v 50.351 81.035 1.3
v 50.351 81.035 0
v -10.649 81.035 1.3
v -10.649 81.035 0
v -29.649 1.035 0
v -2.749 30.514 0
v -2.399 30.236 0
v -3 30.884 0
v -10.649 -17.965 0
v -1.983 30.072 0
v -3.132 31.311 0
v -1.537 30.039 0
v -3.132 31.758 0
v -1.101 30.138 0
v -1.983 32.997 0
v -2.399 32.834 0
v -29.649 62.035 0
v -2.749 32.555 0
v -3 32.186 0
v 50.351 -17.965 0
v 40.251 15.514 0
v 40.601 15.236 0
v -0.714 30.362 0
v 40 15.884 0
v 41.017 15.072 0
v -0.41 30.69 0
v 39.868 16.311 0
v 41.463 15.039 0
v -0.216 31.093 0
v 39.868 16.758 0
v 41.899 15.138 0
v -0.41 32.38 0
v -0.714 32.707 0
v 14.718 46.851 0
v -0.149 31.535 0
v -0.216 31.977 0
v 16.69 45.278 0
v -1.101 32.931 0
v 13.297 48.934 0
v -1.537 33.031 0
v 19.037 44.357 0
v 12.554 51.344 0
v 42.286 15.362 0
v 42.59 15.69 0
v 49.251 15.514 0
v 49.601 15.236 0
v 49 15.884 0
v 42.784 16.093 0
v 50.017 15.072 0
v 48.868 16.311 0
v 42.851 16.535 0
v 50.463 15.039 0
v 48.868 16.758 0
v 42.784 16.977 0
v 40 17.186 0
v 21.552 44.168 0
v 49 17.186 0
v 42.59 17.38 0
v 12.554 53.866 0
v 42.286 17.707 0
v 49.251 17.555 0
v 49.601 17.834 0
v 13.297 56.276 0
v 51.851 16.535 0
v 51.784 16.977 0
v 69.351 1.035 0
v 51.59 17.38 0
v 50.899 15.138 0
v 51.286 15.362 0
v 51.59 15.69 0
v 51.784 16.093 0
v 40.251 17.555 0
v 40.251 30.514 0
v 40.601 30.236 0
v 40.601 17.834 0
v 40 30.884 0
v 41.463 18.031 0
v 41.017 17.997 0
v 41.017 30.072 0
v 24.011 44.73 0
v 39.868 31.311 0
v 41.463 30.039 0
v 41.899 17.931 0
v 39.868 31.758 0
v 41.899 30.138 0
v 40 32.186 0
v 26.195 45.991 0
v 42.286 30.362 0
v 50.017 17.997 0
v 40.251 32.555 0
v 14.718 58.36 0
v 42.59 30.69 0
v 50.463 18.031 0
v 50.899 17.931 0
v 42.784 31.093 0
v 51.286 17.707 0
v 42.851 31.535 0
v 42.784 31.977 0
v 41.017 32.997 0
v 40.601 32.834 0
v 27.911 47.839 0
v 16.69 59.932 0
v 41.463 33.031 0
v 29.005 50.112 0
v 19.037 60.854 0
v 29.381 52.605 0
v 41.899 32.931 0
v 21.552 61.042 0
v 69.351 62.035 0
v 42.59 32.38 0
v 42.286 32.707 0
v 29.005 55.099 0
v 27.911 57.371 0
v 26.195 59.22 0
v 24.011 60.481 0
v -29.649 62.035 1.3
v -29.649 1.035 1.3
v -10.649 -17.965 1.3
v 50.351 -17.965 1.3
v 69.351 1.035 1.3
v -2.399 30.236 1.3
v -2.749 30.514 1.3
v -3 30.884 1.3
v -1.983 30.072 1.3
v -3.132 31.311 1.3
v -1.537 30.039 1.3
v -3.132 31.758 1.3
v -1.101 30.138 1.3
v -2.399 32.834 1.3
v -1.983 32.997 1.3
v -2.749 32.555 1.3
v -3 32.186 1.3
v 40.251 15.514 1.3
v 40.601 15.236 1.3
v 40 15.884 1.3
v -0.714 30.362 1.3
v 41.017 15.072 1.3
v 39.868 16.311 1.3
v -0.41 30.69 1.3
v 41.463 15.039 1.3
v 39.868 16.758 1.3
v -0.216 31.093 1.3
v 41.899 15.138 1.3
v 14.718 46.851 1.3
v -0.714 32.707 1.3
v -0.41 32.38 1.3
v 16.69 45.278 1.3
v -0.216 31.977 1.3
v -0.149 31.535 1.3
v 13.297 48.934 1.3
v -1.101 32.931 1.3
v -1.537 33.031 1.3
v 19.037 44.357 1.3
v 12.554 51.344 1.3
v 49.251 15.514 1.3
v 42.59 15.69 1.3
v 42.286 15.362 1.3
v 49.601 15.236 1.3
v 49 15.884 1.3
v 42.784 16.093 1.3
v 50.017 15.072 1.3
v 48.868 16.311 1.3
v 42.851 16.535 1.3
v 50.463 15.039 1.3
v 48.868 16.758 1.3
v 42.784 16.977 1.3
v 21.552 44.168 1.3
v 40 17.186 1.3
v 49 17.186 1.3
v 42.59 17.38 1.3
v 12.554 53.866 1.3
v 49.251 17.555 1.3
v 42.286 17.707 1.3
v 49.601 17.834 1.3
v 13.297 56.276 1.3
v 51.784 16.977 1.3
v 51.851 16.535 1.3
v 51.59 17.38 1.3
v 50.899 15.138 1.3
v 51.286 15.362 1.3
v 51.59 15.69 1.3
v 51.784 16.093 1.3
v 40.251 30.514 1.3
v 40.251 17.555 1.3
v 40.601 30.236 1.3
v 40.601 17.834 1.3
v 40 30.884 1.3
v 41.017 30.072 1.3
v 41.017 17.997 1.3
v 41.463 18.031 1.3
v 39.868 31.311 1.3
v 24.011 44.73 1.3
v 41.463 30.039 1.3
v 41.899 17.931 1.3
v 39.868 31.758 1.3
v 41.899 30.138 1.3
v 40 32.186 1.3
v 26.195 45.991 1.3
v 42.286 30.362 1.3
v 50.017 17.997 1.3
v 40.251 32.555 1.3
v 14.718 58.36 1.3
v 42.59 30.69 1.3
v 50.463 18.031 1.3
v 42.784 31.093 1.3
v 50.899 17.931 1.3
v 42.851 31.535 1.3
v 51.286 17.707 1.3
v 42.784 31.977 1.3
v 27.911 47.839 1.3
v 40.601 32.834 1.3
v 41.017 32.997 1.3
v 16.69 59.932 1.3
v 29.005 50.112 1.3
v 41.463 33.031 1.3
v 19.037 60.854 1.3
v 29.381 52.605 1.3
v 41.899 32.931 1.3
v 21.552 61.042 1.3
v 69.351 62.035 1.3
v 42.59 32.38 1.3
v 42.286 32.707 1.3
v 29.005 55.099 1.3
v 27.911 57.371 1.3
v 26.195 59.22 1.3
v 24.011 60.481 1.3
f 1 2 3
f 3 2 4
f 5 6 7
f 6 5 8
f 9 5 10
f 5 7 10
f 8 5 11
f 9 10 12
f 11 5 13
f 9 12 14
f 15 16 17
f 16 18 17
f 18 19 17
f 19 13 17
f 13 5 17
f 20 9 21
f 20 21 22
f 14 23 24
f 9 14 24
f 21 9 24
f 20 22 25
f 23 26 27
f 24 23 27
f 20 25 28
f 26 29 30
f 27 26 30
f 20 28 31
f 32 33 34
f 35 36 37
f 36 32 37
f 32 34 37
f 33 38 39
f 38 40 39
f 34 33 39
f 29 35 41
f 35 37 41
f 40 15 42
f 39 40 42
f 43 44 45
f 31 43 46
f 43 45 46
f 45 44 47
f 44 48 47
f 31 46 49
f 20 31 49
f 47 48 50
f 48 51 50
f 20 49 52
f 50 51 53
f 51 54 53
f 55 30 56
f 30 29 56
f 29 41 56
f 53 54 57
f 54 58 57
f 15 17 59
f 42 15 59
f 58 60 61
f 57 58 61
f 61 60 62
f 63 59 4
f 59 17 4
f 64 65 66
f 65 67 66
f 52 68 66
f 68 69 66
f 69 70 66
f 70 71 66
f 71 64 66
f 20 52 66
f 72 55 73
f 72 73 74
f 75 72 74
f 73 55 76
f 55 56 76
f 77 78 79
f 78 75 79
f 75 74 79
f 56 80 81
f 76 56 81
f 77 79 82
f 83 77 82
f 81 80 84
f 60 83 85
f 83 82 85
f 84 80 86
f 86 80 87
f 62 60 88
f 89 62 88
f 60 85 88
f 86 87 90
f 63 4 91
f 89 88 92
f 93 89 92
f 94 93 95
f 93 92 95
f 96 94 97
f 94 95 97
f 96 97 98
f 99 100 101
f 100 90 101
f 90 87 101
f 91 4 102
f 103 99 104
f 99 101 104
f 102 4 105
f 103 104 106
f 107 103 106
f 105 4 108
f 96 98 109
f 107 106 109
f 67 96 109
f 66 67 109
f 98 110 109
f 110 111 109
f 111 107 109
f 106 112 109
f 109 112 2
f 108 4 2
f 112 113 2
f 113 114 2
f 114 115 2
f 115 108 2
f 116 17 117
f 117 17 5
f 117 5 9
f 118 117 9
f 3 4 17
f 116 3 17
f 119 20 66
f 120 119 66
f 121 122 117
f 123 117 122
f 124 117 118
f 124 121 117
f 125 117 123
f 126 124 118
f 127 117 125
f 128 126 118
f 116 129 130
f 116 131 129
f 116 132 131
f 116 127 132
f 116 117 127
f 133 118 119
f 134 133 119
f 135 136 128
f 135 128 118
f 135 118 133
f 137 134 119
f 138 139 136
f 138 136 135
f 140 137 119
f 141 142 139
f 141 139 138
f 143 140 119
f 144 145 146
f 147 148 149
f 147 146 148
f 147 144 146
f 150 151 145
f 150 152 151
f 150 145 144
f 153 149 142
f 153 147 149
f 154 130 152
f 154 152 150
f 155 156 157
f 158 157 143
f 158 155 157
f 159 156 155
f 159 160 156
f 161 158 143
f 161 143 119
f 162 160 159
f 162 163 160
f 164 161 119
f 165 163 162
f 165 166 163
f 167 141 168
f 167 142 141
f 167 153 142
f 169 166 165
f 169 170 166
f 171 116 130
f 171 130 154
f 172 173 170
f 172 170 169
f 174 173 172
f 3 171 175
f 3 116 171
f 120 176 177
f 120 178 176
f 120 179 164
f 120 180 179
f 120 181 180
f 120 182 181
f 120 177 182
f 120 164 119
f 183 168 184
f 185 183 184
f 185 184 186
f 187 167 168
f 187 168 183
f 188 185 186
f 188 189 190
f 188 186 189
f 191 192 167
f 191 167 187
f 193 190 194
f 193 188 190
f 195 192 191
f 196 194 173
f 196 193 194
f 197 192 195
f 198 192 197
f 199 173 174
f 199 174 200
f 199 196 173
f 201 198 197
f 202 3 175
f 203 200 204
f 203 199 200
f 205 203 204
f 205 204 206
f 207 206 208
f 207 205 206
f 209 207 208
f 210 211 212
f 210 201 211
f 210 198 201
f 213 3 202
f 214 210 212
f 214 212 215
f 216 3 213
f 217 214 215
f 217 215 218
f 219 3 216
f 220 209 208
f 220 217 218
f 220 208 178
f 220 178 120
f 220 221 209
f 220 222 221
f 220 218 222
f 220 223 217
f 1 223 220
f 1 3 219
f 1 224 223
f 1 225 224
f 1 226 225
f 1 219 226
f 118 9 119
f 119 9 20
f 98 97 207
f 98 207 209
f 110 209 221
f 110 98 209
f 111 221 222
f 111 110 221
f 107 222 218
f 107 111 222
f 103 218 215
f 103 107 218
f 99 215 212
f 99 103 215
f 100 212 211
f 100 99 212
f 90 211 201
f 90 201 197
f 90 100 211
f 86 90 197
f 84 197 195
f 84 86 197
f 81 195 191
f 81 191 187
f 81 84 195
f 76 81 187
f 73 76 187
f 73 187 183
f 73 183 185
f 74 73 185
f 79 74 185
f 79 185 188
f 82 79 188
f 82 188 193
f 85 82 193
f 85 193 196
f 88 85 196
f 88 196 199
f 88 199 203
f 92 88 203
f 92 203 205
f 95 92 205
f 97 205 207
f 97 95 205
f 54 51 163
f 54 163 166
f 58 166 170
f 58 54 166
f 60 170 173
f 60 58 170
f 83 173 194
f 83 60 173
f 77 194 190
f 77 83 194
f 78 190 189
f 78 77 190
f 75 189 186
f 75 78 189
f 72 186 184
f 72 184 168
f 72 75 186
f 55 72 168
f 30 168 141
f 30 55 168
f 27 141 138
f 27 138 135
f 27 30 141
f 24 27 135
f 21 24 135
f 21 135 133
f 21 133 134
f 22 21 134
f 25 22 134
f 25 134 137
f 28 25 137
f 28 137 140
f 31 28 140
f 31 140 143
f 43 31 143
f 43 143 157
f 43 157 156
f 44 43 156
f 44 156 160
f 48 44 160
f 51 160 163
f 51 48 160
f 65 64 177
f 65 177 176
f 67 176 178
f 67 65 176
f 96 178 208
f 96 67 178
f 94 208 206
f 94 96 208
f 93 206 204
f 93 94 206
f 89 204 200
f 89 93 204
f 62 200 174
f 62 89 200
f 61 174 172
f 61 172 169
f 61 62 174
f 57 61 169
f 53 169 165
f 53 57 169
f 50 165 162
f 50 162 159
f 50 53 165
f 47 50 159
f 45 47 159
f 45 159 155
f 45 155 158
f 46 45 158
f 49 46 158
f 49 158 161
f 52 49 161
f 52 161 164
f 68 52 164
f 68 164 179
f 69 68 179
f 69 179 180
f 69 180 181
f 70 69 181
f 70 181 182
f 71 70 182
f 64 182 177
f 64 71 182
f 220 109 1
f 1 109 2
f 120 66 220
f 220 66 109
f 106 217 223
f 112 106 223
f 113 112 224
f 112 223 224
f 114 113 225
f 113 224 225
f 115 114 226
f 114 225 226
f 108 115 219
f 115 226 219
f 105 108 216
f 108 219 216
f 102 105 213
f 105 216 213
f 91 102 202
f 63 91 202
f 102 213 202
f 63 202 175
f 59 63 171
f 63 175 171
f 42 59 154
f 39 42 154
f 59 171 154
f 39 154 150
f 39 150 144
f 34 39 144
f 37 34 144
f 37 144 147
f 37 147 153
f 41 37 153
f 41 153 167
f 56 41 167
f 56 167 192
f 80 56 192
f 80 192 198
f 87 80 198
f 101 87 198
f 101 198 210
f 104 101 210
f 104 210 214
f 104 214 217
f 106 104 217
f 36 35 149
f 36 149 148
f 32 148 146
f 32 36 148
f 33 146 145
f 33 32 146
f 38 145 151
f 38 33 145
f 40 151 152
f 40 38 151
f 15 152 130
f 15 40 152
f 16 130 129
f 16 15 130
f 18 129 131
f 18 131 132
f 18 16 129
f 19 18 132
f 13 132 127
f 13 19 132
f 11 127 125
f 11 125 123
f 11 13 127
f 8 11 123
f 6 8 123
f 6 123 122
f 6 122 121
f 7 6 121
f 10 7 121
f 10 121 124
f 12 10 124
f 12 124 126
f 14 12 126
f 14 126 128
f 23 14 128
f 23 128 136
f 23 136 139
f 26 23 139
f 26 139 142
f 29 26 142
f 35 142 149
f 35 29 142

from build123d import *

# Parameters (mm, degrees)
SKETCH1_R           = 1.5
BOSS_EXTRUDE1_DEPTH = 1.3
SKETCH3_R           = 8.460587883
CUT_EXTRUDE1_DEPTH  = 20


with BuildPart() as part:
    # Sketch1 → Boss-Extrude1 (new body)
    with BuildSketch(Plane.XY):
        Polygon((-29.648967954, 62.034735519), (-29.648967954, 1.034735519), (-10.648967954, -17.965264481), (50.351032046, -17.965264481), (69.351032046, 1.034735519), (69.351032046, 62.034735519), (50.351032046, 81.034735519), (-10.648967954, 81.034735519), align=None)
        with Locations((-1.648967954, 31.534735519)):
            Circle(SKETCH1_R, mode=Mode.SUBTRACT)
        with Locations((41.351032046, 31.534735519)):
            Circle(SKETCH1_R, mode=Mode.SUBTRACT)
        with Locations((41.351032046, 16.534735519)):
            Circle(SKETCH1_R, mode=Mode.SUBTRACT)
        with Locations((50.351032046, 16.534735519)):
            Circle(SKETCH1_R, mode=Mode.SUBTRACT)
    extrude(amount=BOSS_EXTRUDE1_DEPTH)

    # Sketch3 → Cut-Extrude1 (cut)
    with BuildSketch(Plane.XY.offset(1.3)):
        with Locations((20.92010377, 52.605401567)):
            Circle(SKETCH3_R)
    extrude(amount=-CUT_EXTRUDE1_DEPTH, mode=Mode.SUBTRACT)


solid = part.part
